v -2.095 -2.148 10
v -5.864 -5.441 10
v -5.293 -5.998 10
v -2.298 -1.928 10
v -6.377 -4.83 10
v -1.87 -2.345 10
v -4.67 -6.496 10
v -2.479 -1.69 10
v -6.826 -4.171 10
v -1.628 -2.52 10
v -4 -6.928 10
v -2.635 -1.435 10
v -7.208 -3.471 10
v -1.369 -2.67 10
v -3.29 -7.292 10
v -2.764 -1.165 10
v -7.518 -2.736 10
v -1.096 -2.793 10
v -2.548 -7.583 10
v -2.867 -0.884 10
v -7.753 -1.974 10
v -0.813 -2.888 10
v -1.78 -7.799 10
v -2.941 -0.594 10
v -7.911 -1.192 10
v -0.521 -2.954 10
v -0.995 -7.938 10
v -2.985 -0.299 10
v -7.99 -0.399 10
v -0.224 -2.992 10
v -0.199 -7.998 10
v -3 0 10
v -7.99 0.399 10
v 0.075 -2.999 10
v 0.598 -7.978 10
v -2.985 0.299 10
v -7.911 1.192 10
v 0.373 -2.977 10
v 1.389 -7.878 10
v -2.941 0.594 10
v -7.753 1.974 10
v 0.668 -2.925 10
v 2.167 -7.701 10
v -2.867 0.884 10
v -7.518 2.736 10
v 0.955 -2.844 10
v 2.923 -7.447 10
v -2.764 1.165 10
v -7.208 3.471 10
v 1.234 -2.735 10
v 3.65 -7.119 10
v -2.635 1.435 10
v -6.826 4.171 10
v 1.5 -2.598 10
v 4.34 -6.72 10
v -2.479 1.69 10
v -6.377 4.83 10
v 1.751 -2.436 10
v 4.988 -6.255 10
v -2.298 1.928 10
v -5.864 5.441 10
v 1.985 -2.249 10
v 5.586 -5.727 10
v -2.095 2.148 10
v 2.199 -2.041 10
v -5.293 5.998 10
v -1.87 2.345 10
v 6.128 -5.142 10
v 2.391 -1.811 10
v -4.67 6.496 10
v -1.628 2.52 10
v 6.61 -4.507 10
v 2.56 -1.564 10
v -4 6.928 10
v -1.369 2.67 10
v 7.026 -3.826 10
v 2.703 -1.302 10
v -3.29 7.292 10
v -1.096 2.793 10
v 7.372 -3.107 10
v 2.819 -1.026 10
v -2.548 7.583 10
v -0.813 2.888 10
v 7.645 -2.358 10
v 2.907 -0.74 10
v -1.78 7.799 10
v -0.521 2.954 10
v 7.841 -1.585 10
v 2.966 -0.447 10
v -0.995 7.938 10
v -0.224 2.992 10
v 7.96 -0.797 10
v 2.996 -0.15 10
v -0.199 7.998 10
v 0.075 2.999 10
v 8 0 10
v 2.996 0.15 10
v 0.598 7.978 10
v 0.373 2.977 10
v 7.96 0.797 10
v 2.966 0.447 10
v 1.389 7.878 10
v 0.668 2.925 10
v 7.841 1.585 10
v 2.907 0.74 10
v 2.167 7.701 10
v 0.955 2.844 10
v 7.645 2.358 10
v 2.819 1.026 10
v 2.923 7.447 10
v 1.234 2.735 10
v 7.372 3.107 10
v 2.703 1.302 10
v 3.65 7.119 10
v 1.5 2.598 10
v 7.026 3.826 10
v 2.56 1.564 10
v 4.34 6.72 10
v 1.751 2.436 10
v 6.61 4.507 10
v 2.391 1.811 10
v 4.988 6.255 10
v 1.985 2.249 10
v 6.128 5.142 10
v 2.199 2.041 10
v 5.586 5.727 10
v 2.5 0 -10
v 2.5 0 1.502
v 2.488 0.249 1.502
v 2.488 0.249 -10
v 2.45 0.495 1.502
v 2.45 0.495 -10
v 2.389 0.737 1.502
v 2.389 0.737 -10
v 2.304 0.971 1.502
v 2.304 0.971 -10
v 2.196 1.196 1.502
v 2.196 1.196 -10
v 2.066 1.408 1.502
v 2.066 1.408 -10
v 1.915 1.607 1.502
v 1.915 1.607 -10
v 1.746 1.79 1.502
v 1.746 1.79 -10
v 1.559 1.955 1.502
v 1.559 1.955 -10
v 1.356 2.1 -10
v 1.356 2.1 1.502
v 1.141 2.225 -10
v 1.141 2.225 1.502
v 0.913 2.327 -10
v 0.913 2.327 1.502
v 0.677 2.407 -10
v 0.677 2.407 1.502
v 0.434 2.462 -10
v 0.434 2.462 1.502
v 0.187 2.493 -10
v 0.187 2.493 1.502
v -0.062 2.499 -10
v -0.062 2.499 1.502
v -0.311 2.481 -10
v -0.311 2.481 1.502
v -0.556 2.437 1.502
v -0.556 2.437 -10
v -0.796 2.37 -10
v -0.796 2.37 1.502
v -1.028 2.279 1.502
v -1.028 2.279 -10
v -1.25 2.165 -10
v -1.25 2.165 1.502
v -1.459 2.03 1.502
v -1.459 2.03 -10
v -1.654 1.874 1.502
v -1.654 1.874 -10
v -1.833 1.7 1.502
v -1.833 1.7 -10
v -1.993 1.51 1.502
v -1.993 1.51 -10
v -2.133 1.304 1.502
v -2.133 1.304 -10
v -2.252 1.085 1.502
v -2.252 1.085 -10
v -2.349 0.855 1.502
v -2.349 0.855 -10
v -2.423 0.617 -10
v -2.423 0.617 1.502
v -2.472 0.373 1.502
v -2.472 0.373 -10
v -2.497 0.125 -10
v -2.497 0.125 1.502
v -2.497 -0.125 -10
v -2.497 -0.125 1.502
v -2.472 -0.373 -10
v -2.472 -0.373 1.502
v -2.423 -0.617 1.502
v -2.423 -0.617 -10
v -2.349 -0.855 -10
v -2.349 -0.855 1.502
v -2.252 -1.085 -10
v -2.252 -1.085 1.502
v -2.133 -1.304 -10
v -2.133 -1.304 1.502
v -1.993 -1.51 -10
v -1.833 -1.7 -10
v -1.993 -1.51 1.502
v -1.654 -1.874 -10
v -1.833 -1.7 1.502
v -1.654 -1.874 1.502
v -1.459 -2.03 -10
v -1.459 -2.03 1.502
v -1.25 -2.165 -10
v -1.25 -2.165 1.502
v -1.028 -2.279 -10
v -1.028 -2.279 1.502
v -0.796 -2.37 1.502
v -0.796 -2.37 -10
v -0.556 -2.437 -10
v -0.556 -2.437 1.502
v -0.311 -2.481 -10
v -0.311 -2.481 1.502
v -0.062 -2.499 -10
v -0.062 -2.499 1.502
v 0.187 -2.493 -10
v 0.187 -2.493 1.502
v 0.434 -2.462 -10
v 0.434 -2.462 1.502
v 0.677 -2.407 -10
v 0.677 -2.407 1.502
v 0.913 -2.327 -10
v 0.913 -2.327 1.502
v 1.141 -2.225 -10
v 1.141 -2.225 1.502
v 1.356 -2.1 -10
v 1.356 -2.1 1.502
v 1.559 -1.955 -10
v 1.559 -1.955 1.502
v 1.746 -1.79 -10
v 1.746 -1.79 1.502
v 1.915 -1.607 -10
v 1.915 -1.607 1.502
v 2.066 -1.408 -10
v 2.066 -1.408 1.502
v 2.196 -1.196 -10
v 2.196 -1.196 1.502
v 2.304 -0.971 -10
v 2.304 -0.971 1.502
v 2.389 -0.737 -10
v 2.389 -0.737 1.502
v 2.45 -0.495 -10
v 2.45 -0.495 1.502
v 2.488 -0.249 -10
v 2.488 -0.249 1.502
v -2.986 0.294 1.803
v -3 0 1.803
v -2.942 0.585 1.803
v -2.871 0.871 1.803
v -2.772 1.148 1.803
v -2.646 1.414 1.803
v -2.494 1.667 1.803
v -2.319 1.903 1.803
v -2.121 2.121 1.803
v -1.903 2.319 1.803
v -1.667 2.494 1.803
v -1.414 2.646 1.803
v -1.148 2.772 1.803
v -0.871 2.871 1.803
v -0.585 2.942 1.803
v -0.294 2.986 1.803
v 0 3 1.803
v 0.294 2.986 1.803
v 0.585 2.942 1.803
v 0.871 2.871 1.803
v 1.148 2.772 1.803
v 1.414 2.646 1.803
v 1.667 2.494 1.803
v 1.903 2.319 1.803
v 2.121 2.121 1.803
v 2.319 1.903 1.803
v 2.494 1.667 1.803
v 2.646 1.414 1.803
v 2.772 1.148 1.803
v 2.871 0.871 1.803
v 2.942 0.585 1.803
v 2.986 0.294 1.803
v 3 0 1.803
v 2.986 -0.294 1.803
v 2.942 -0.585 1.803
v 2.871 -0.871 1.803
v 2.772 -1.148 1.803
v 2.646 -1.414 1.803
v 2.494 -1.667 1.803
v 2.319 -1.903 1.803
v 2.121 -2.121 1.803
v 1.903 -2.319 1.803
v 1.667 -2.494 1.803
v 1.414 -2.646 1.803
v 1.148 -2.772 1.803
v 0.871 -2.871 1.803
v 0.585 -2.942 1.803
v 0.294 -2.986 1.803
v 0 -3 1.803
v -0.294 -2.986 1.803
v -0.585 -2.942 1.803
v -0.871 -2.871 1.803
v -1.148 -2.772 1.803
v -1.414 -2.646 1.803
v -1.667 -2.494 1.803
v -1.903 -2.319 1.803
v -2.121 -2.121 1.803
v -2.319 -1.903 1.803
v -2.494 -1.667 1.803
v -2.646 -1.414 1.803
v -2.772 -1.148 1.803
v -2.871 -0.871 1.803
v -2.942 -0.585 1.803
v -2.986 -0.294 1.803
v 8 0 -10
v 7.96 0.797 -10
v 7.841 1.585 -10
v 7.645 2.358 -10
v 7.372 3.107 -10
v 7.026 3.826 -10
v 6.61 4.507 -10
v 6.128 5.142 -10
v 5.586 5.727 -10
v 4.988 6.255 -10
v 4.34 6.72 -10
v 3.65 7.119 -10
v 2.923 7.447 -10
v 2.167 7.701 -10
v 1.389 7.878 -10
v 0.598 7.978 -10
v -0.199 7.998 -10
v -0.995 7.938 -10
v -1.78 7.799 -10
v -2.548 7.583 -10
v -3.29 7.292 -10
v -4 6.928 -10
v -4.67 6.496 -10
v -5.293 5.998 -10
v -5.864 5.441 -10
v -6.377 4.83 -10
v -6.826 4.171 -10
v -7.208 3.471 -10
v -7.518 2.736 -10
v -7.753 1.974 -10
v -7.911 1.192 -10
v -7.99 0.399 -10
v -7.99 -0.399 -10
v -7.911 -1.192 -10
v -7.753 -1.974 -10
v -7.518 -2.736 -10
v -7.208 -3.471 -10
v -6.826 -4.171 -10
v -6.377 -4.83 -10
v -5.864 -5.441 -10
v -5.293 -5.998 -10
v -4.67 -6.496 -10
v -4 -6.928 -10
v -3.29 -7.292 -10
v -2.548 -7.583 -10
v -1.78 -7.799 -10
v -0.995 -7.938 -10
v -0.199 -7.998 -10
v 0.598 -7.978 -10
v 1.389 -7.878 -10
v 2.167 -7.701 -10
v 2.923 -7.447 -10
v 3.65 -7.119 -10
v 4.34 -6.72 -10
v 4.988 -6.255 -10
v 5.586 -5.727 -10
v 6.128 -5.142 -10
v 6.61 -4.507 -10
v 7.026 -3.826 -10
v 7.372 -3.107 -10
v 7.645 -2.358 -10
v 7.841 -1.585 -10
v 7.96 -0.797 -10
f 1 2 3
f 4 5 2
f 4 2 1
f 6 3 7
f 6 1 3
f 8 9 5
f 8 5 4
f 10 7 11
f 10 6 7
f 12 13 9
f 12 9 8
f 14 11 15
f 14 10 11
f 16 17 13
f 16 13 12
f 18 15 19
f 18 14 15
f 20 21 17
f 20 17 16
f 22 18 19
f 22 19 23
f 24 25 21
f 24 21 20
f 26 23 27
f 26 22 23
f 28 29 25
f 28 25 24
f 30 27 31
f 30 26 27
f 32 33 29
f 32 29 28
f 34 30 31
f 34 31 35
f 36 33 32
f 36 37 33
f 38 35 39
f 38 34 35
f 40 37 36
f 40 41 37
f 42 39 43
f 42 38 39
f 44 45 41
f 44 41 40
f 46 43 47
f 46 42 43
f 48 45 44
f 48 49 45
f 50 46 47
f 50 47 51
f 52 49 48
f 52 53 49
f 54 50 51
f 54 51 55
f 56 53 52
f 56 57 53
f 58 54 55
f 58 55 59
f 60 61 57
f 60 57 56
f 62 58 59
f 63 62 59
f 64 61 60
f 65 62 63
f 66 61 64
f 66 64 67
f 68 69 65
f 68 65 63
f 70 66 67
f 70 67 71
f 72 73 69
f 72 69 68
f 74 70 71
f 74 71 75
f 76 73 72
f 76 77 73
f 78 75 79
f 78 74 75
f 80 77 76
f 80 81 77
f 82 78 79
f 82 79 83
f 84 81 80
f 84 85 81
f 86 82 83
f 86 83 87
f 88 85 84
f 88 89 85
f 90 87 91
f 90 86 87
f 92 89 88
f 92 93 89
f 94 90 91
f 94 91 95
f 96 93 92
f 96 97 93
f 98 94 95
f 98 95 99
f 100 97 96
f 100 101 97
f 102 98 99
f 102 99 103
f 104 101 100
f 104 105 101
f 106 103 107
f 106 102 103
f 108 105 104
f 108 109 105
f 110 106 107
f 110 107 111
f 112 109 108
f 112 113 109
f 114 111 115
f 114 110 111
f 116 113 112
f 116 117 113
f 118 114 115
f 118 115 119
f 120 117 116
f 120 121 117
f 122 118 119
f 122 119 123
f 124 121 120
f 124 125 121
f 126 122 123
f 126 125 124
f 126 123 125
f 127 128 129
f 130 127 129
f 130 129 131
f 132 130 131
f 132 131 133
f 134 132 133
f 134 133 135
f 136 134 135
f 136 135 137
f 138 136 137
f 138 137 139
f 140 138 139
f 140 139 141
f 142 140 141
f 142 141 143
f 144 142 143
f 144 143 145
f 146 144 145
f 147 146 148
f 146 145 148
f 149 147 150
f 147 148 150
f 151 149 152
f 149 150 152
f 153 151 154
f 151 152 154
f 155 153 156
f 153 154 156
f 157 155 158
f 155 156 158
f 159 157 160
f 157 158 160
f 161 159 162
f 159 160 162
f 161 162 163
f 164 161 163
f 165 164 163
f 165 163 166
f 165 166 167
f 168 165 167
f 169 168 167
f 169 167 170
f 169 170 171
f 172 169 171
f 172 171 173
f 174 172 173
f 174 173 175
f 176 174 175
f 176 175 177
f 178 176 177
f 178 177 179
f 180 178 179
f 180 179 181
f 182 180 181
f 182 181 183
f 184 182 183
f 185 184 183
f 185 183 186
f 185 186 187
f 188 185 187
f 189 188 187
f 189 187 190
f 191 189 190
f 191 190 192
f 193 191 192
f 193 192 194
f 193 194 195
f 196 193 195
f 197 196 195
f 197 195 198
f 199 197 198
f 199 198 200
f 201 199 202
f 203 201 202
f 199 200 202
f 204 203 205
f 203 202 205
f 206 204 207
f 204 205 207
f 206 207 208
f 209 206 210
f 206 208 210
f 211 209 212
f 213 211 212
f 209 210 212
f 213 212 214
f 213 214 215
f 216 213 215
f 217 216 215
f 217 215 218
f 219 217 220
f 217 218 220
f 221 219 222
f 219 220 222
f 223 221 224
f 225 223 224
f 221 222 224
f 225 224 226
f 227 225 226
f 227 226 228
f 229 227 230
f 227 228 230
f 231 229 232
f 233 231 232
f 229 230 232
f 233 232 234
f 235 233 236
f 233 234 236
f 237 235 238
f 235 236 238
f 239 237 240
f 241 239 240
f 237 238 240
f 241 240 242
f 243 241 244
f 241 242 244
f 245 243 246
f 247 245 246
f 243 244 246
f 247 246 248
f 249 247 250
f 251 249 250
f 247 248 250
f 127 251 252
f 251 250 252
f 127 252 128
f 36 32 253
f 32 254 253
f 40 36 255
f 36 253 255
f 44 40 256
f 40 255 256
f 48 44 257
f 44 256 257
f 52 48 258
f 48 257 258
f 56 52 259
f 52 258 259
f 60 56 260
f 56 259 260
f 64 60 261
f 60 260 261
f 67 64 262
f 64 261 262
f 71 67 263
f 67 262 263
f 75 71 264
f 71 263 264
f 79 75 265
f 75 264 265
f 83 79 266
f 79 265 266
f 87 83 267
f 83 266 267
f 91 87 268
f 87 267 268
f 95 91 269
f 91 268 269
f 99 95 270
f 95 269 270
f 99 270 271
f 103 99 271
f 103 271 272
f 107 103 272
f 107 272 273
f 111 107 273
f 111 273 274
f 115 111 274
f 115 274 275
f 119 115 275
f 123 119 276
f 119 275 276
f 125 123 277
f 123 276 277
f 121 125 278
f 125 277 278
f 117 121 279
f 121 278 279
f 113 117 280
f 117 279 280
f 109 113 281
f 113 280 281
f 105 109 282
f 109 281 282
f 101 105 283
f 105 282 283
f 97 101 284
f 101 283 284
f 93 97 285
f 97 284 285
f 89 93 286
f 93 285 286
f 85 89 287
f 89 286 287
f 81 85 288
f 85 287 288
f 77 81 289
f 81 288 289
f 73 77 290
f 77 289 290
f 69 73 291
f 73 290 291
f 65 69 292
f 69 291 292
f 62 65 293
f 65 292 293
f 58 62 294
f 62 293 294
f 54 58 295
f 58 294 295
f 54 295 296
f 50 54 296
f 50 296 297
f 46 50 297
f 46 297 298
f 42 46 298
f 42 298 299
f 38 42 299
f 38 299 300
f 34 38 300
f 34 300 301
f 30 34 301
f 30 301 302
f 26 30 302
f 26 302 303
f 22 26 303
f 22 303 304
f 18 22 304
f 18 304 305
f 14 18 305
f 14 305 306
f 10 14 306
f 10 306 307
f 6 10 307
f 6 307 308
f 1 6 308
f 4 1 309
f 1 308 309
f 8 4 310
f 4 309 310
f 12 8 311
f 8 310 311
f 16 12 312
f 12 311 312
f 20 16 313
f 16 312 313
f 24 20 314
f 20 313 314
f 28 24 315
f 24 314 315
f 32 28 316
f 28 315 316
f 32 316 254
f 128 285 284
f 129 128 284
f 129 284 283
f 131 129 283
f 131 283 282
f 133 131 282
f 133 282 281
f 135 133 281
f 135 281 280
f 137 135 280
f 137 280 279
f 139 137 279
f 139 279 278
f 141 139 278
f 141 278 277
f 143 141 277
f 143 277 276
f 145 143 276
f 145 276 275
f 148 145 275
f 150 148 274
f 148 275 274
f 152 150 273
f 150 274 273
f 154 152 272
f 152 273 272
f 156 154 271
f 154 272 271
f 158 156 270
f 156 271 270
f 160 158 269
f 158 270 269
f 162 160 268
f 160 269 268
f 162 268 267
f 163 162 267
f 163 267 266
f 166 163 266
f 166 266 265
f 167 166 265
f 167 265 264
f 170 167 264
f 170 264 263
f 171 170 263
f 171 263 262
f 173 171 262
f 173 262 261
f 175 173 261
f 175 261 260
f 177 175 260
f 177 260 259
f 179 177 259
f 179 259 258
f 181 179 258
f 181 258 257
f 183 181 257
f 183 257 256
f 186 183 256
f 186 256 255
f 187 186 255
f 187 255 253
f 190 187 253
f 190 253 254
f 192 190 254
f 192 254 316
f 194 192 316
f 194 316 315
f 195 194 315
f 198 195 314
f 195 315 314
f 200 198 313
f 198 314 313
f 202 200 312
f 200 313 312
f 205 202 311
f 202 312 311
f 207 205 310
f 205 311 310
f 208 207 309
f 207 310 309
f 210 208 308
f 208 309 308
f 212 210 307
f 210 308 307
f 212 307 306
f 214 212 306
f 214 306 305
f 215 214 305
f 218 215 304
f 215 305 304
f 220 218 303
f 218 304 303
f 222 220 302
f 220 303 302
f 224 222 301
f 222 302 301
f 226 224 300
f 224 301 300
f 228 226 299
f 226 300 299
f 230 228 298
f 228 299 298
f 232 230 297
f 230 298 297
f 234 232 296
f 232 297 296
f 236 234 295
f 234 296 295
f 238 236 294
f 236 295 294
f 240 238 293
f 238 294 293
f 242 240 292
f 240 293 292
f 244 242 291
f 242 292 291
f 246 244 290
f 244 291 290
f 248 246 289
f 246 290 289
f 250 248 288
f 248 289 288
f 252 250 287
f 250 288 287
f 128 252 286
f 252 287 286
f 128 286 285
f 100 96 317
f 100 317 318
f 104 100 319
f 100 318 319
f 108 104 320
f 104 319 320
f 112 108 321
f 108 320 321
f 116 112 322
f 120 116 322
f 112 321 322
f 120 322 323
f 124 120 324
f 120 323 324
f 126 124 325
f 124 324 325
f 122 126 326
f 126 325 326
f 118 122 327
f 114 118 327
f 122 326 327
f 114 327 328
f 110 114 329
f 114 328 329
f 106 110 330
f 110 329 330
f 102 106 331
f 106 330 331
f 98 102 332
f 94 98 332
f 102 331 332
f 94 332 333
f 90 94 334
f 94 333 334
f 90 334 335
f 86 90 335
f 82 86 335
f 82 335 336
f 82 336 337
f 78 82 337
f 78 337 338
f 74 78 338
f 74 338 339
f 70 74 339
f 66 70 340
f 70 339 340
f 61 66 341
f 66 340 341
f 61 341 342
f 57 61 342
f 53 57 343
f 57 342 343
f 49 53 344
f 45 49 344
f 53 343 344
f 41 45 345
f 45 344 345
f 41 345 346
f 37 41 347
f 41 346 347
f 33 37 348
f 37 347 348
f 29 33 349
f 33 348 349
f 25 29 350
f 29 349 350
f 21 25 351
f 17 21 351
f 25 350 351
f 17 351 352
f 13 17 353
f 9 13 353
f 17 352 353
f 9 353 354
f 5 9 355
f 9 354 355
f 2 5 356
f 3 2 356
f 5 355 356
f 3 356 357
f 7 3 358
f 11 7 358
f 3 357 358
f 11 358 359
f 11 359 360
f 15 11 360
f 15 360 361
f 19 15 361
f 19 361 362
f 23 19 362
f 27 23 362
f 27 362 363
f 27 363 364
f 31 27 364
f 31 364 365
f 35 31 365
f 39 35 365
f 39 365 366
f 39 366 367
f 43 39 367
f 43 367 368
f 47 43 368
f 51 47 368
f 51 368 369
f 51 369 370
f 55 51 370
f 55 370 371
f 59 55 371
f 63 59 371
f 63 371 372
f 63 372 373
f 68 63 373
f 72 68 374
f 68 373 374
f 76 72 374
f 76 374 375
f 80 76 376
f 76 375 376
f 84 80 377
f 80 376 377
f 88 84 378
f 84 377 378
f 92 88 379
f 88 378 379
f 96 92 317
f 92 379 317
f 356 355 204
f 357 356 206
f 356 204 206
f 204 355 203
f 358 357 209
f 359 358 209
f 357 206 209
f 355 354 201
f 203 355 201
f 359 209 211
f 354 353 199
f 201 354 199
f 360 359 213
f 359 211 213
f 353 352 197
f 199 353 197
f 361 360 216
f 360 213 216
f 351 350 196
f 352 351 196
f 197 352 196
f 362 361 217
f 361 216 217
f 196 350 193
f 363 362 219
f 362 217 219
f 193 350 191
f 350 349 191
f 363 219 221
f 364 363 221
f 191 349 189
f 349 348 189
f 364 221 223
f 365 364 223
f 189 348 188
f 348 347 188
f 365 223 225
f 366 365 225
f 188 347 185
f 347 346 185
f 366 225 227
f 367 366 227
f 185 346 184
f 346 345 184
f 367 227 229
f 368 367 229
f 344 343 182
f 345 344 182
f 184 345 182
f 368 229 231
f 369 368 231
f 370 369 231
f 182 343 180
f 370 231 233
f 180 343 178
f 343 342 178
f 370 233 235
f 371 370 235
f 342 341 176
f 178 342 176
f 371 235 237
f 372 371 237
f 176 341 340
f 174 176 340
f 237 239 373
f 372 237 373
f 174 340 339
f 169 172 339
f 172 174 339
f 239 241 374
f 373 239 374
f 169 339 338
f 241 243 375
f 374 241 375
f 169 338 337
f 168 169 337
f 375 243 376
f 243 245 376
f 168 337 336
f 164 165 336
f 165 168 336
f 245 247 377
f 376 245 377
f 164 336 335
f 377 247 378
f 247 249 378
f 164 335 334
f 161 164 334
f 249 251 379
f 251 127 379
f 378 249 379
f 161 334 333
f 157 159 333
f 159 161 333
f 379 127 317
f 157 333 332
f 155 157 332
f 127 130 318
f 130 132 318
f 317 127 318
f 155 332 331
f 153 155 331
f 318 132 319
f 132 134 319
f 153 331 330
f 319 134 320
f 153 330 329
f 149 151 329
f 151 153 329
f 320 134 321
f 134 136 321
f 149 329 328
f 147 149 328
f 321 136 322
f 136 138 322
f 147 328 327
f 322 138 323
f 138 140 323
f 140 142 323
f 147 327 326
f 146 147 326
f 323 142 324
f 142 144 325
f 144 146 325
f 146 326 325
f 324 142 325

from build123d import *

# Parameters (mm, degrees)
AUFSATZ_LINEAR_AUSTRAGEN1_DEPTH      = 10
AUFSATZ_LINEAR_AUSTRAGEN1_DEPTH_BACK = 10
SKIZZE1_R                            = 8
F_6_0_6_DURCHMESSER_BOHRUNG1_D       = 6
F_6_0_6_DURCHMESSER_BOHRUNG1_DEPTH   = 8.197418143
F_6_0_6_DURCHMESSER_BOHRUNG1_TIP     = 1.802581857
F_5_0_5_DURCHMESSER_BOHRUNG5_D       = 5
F_5_0_5_DURCHMESSER_BOHRUNG5_DEPTH   = 18.497848452
F_5_0_5_DURCHMESSER_BOHRUNG5_TIP     = 1.502151548


with BuildPart() as part:
    # Skizze1 → Aufsatz-Linear austragen1 (new, two sides: drawn at the far end of the back side and taken through both)
    with BuildSketch(Plane.XY.offset(-AUFSATZ_LINEAR_AUSTRAGEN1_DEPTH_BACK)):
        Circle(SKIZZE1_R)
    extrude(amount=AUFSATZ_LINEAR_AUSTRAGEN1_DEPTH + AUFSATZ_LINEAR_AUSTRAGEN1_DEPTH_BACK)

    # Ø6.0 (6) Durchmesser Bohrung1
    with Locations(Plane.XY.offset(10)):
        with Locations((0, 0)):
            Hole(F_6_0_6_DURCHMESSER_BOHRUNG1_D / 2, depth=F_6_0_6_DURCHMESSER_BOHRUNG1_DEPTH)
            with Locations((0, 0, -(F_6_0_6_DURCHMESSER_BOHRUNG1_DEPTH + F_6_0_6_DURCHMESSER_BOHRUNG1_TIP / 2))):  # 118° drill point
                Cone(0, F_6_0_6_DURCHMESSER_BOHRUNG1_D / 2, F_6_0_6_DURCHMESSER_BOHRUNG1_TIP, mode=Mode.SUBTRACT)

    # Ø5.0 (5) Durchmesser Bohrung5
    with Locations(Plane(origin=(0, 0, -10), x_dir=(-1, 0, 0), z_dir=(0, 0, -1))):
        with Locations((0, 0)):
            Hole(F_5_0_5_DURCHMESSER_BOHRUNG5_D / 2, depth=F_5_0_5_DURCHMESSER_BOHRUNG5_DEPTH)
            with Locations((0, 0, -(F_5_0_5_DURCHMESSER_BOHRUNG5_DEPTH + F_5_0_5_DURCHMESSER_BOHRUNG5_TIP / 2))):  # 118° drill point
                Cone(0, F_5_0_5_DURCHMESSER_BOHRUNG5_D / 2, F_5_0_5_DURCHMESSER_BOHRUNG5_TIP, mode=Mode.SUBTRACT)


solid = part.part
